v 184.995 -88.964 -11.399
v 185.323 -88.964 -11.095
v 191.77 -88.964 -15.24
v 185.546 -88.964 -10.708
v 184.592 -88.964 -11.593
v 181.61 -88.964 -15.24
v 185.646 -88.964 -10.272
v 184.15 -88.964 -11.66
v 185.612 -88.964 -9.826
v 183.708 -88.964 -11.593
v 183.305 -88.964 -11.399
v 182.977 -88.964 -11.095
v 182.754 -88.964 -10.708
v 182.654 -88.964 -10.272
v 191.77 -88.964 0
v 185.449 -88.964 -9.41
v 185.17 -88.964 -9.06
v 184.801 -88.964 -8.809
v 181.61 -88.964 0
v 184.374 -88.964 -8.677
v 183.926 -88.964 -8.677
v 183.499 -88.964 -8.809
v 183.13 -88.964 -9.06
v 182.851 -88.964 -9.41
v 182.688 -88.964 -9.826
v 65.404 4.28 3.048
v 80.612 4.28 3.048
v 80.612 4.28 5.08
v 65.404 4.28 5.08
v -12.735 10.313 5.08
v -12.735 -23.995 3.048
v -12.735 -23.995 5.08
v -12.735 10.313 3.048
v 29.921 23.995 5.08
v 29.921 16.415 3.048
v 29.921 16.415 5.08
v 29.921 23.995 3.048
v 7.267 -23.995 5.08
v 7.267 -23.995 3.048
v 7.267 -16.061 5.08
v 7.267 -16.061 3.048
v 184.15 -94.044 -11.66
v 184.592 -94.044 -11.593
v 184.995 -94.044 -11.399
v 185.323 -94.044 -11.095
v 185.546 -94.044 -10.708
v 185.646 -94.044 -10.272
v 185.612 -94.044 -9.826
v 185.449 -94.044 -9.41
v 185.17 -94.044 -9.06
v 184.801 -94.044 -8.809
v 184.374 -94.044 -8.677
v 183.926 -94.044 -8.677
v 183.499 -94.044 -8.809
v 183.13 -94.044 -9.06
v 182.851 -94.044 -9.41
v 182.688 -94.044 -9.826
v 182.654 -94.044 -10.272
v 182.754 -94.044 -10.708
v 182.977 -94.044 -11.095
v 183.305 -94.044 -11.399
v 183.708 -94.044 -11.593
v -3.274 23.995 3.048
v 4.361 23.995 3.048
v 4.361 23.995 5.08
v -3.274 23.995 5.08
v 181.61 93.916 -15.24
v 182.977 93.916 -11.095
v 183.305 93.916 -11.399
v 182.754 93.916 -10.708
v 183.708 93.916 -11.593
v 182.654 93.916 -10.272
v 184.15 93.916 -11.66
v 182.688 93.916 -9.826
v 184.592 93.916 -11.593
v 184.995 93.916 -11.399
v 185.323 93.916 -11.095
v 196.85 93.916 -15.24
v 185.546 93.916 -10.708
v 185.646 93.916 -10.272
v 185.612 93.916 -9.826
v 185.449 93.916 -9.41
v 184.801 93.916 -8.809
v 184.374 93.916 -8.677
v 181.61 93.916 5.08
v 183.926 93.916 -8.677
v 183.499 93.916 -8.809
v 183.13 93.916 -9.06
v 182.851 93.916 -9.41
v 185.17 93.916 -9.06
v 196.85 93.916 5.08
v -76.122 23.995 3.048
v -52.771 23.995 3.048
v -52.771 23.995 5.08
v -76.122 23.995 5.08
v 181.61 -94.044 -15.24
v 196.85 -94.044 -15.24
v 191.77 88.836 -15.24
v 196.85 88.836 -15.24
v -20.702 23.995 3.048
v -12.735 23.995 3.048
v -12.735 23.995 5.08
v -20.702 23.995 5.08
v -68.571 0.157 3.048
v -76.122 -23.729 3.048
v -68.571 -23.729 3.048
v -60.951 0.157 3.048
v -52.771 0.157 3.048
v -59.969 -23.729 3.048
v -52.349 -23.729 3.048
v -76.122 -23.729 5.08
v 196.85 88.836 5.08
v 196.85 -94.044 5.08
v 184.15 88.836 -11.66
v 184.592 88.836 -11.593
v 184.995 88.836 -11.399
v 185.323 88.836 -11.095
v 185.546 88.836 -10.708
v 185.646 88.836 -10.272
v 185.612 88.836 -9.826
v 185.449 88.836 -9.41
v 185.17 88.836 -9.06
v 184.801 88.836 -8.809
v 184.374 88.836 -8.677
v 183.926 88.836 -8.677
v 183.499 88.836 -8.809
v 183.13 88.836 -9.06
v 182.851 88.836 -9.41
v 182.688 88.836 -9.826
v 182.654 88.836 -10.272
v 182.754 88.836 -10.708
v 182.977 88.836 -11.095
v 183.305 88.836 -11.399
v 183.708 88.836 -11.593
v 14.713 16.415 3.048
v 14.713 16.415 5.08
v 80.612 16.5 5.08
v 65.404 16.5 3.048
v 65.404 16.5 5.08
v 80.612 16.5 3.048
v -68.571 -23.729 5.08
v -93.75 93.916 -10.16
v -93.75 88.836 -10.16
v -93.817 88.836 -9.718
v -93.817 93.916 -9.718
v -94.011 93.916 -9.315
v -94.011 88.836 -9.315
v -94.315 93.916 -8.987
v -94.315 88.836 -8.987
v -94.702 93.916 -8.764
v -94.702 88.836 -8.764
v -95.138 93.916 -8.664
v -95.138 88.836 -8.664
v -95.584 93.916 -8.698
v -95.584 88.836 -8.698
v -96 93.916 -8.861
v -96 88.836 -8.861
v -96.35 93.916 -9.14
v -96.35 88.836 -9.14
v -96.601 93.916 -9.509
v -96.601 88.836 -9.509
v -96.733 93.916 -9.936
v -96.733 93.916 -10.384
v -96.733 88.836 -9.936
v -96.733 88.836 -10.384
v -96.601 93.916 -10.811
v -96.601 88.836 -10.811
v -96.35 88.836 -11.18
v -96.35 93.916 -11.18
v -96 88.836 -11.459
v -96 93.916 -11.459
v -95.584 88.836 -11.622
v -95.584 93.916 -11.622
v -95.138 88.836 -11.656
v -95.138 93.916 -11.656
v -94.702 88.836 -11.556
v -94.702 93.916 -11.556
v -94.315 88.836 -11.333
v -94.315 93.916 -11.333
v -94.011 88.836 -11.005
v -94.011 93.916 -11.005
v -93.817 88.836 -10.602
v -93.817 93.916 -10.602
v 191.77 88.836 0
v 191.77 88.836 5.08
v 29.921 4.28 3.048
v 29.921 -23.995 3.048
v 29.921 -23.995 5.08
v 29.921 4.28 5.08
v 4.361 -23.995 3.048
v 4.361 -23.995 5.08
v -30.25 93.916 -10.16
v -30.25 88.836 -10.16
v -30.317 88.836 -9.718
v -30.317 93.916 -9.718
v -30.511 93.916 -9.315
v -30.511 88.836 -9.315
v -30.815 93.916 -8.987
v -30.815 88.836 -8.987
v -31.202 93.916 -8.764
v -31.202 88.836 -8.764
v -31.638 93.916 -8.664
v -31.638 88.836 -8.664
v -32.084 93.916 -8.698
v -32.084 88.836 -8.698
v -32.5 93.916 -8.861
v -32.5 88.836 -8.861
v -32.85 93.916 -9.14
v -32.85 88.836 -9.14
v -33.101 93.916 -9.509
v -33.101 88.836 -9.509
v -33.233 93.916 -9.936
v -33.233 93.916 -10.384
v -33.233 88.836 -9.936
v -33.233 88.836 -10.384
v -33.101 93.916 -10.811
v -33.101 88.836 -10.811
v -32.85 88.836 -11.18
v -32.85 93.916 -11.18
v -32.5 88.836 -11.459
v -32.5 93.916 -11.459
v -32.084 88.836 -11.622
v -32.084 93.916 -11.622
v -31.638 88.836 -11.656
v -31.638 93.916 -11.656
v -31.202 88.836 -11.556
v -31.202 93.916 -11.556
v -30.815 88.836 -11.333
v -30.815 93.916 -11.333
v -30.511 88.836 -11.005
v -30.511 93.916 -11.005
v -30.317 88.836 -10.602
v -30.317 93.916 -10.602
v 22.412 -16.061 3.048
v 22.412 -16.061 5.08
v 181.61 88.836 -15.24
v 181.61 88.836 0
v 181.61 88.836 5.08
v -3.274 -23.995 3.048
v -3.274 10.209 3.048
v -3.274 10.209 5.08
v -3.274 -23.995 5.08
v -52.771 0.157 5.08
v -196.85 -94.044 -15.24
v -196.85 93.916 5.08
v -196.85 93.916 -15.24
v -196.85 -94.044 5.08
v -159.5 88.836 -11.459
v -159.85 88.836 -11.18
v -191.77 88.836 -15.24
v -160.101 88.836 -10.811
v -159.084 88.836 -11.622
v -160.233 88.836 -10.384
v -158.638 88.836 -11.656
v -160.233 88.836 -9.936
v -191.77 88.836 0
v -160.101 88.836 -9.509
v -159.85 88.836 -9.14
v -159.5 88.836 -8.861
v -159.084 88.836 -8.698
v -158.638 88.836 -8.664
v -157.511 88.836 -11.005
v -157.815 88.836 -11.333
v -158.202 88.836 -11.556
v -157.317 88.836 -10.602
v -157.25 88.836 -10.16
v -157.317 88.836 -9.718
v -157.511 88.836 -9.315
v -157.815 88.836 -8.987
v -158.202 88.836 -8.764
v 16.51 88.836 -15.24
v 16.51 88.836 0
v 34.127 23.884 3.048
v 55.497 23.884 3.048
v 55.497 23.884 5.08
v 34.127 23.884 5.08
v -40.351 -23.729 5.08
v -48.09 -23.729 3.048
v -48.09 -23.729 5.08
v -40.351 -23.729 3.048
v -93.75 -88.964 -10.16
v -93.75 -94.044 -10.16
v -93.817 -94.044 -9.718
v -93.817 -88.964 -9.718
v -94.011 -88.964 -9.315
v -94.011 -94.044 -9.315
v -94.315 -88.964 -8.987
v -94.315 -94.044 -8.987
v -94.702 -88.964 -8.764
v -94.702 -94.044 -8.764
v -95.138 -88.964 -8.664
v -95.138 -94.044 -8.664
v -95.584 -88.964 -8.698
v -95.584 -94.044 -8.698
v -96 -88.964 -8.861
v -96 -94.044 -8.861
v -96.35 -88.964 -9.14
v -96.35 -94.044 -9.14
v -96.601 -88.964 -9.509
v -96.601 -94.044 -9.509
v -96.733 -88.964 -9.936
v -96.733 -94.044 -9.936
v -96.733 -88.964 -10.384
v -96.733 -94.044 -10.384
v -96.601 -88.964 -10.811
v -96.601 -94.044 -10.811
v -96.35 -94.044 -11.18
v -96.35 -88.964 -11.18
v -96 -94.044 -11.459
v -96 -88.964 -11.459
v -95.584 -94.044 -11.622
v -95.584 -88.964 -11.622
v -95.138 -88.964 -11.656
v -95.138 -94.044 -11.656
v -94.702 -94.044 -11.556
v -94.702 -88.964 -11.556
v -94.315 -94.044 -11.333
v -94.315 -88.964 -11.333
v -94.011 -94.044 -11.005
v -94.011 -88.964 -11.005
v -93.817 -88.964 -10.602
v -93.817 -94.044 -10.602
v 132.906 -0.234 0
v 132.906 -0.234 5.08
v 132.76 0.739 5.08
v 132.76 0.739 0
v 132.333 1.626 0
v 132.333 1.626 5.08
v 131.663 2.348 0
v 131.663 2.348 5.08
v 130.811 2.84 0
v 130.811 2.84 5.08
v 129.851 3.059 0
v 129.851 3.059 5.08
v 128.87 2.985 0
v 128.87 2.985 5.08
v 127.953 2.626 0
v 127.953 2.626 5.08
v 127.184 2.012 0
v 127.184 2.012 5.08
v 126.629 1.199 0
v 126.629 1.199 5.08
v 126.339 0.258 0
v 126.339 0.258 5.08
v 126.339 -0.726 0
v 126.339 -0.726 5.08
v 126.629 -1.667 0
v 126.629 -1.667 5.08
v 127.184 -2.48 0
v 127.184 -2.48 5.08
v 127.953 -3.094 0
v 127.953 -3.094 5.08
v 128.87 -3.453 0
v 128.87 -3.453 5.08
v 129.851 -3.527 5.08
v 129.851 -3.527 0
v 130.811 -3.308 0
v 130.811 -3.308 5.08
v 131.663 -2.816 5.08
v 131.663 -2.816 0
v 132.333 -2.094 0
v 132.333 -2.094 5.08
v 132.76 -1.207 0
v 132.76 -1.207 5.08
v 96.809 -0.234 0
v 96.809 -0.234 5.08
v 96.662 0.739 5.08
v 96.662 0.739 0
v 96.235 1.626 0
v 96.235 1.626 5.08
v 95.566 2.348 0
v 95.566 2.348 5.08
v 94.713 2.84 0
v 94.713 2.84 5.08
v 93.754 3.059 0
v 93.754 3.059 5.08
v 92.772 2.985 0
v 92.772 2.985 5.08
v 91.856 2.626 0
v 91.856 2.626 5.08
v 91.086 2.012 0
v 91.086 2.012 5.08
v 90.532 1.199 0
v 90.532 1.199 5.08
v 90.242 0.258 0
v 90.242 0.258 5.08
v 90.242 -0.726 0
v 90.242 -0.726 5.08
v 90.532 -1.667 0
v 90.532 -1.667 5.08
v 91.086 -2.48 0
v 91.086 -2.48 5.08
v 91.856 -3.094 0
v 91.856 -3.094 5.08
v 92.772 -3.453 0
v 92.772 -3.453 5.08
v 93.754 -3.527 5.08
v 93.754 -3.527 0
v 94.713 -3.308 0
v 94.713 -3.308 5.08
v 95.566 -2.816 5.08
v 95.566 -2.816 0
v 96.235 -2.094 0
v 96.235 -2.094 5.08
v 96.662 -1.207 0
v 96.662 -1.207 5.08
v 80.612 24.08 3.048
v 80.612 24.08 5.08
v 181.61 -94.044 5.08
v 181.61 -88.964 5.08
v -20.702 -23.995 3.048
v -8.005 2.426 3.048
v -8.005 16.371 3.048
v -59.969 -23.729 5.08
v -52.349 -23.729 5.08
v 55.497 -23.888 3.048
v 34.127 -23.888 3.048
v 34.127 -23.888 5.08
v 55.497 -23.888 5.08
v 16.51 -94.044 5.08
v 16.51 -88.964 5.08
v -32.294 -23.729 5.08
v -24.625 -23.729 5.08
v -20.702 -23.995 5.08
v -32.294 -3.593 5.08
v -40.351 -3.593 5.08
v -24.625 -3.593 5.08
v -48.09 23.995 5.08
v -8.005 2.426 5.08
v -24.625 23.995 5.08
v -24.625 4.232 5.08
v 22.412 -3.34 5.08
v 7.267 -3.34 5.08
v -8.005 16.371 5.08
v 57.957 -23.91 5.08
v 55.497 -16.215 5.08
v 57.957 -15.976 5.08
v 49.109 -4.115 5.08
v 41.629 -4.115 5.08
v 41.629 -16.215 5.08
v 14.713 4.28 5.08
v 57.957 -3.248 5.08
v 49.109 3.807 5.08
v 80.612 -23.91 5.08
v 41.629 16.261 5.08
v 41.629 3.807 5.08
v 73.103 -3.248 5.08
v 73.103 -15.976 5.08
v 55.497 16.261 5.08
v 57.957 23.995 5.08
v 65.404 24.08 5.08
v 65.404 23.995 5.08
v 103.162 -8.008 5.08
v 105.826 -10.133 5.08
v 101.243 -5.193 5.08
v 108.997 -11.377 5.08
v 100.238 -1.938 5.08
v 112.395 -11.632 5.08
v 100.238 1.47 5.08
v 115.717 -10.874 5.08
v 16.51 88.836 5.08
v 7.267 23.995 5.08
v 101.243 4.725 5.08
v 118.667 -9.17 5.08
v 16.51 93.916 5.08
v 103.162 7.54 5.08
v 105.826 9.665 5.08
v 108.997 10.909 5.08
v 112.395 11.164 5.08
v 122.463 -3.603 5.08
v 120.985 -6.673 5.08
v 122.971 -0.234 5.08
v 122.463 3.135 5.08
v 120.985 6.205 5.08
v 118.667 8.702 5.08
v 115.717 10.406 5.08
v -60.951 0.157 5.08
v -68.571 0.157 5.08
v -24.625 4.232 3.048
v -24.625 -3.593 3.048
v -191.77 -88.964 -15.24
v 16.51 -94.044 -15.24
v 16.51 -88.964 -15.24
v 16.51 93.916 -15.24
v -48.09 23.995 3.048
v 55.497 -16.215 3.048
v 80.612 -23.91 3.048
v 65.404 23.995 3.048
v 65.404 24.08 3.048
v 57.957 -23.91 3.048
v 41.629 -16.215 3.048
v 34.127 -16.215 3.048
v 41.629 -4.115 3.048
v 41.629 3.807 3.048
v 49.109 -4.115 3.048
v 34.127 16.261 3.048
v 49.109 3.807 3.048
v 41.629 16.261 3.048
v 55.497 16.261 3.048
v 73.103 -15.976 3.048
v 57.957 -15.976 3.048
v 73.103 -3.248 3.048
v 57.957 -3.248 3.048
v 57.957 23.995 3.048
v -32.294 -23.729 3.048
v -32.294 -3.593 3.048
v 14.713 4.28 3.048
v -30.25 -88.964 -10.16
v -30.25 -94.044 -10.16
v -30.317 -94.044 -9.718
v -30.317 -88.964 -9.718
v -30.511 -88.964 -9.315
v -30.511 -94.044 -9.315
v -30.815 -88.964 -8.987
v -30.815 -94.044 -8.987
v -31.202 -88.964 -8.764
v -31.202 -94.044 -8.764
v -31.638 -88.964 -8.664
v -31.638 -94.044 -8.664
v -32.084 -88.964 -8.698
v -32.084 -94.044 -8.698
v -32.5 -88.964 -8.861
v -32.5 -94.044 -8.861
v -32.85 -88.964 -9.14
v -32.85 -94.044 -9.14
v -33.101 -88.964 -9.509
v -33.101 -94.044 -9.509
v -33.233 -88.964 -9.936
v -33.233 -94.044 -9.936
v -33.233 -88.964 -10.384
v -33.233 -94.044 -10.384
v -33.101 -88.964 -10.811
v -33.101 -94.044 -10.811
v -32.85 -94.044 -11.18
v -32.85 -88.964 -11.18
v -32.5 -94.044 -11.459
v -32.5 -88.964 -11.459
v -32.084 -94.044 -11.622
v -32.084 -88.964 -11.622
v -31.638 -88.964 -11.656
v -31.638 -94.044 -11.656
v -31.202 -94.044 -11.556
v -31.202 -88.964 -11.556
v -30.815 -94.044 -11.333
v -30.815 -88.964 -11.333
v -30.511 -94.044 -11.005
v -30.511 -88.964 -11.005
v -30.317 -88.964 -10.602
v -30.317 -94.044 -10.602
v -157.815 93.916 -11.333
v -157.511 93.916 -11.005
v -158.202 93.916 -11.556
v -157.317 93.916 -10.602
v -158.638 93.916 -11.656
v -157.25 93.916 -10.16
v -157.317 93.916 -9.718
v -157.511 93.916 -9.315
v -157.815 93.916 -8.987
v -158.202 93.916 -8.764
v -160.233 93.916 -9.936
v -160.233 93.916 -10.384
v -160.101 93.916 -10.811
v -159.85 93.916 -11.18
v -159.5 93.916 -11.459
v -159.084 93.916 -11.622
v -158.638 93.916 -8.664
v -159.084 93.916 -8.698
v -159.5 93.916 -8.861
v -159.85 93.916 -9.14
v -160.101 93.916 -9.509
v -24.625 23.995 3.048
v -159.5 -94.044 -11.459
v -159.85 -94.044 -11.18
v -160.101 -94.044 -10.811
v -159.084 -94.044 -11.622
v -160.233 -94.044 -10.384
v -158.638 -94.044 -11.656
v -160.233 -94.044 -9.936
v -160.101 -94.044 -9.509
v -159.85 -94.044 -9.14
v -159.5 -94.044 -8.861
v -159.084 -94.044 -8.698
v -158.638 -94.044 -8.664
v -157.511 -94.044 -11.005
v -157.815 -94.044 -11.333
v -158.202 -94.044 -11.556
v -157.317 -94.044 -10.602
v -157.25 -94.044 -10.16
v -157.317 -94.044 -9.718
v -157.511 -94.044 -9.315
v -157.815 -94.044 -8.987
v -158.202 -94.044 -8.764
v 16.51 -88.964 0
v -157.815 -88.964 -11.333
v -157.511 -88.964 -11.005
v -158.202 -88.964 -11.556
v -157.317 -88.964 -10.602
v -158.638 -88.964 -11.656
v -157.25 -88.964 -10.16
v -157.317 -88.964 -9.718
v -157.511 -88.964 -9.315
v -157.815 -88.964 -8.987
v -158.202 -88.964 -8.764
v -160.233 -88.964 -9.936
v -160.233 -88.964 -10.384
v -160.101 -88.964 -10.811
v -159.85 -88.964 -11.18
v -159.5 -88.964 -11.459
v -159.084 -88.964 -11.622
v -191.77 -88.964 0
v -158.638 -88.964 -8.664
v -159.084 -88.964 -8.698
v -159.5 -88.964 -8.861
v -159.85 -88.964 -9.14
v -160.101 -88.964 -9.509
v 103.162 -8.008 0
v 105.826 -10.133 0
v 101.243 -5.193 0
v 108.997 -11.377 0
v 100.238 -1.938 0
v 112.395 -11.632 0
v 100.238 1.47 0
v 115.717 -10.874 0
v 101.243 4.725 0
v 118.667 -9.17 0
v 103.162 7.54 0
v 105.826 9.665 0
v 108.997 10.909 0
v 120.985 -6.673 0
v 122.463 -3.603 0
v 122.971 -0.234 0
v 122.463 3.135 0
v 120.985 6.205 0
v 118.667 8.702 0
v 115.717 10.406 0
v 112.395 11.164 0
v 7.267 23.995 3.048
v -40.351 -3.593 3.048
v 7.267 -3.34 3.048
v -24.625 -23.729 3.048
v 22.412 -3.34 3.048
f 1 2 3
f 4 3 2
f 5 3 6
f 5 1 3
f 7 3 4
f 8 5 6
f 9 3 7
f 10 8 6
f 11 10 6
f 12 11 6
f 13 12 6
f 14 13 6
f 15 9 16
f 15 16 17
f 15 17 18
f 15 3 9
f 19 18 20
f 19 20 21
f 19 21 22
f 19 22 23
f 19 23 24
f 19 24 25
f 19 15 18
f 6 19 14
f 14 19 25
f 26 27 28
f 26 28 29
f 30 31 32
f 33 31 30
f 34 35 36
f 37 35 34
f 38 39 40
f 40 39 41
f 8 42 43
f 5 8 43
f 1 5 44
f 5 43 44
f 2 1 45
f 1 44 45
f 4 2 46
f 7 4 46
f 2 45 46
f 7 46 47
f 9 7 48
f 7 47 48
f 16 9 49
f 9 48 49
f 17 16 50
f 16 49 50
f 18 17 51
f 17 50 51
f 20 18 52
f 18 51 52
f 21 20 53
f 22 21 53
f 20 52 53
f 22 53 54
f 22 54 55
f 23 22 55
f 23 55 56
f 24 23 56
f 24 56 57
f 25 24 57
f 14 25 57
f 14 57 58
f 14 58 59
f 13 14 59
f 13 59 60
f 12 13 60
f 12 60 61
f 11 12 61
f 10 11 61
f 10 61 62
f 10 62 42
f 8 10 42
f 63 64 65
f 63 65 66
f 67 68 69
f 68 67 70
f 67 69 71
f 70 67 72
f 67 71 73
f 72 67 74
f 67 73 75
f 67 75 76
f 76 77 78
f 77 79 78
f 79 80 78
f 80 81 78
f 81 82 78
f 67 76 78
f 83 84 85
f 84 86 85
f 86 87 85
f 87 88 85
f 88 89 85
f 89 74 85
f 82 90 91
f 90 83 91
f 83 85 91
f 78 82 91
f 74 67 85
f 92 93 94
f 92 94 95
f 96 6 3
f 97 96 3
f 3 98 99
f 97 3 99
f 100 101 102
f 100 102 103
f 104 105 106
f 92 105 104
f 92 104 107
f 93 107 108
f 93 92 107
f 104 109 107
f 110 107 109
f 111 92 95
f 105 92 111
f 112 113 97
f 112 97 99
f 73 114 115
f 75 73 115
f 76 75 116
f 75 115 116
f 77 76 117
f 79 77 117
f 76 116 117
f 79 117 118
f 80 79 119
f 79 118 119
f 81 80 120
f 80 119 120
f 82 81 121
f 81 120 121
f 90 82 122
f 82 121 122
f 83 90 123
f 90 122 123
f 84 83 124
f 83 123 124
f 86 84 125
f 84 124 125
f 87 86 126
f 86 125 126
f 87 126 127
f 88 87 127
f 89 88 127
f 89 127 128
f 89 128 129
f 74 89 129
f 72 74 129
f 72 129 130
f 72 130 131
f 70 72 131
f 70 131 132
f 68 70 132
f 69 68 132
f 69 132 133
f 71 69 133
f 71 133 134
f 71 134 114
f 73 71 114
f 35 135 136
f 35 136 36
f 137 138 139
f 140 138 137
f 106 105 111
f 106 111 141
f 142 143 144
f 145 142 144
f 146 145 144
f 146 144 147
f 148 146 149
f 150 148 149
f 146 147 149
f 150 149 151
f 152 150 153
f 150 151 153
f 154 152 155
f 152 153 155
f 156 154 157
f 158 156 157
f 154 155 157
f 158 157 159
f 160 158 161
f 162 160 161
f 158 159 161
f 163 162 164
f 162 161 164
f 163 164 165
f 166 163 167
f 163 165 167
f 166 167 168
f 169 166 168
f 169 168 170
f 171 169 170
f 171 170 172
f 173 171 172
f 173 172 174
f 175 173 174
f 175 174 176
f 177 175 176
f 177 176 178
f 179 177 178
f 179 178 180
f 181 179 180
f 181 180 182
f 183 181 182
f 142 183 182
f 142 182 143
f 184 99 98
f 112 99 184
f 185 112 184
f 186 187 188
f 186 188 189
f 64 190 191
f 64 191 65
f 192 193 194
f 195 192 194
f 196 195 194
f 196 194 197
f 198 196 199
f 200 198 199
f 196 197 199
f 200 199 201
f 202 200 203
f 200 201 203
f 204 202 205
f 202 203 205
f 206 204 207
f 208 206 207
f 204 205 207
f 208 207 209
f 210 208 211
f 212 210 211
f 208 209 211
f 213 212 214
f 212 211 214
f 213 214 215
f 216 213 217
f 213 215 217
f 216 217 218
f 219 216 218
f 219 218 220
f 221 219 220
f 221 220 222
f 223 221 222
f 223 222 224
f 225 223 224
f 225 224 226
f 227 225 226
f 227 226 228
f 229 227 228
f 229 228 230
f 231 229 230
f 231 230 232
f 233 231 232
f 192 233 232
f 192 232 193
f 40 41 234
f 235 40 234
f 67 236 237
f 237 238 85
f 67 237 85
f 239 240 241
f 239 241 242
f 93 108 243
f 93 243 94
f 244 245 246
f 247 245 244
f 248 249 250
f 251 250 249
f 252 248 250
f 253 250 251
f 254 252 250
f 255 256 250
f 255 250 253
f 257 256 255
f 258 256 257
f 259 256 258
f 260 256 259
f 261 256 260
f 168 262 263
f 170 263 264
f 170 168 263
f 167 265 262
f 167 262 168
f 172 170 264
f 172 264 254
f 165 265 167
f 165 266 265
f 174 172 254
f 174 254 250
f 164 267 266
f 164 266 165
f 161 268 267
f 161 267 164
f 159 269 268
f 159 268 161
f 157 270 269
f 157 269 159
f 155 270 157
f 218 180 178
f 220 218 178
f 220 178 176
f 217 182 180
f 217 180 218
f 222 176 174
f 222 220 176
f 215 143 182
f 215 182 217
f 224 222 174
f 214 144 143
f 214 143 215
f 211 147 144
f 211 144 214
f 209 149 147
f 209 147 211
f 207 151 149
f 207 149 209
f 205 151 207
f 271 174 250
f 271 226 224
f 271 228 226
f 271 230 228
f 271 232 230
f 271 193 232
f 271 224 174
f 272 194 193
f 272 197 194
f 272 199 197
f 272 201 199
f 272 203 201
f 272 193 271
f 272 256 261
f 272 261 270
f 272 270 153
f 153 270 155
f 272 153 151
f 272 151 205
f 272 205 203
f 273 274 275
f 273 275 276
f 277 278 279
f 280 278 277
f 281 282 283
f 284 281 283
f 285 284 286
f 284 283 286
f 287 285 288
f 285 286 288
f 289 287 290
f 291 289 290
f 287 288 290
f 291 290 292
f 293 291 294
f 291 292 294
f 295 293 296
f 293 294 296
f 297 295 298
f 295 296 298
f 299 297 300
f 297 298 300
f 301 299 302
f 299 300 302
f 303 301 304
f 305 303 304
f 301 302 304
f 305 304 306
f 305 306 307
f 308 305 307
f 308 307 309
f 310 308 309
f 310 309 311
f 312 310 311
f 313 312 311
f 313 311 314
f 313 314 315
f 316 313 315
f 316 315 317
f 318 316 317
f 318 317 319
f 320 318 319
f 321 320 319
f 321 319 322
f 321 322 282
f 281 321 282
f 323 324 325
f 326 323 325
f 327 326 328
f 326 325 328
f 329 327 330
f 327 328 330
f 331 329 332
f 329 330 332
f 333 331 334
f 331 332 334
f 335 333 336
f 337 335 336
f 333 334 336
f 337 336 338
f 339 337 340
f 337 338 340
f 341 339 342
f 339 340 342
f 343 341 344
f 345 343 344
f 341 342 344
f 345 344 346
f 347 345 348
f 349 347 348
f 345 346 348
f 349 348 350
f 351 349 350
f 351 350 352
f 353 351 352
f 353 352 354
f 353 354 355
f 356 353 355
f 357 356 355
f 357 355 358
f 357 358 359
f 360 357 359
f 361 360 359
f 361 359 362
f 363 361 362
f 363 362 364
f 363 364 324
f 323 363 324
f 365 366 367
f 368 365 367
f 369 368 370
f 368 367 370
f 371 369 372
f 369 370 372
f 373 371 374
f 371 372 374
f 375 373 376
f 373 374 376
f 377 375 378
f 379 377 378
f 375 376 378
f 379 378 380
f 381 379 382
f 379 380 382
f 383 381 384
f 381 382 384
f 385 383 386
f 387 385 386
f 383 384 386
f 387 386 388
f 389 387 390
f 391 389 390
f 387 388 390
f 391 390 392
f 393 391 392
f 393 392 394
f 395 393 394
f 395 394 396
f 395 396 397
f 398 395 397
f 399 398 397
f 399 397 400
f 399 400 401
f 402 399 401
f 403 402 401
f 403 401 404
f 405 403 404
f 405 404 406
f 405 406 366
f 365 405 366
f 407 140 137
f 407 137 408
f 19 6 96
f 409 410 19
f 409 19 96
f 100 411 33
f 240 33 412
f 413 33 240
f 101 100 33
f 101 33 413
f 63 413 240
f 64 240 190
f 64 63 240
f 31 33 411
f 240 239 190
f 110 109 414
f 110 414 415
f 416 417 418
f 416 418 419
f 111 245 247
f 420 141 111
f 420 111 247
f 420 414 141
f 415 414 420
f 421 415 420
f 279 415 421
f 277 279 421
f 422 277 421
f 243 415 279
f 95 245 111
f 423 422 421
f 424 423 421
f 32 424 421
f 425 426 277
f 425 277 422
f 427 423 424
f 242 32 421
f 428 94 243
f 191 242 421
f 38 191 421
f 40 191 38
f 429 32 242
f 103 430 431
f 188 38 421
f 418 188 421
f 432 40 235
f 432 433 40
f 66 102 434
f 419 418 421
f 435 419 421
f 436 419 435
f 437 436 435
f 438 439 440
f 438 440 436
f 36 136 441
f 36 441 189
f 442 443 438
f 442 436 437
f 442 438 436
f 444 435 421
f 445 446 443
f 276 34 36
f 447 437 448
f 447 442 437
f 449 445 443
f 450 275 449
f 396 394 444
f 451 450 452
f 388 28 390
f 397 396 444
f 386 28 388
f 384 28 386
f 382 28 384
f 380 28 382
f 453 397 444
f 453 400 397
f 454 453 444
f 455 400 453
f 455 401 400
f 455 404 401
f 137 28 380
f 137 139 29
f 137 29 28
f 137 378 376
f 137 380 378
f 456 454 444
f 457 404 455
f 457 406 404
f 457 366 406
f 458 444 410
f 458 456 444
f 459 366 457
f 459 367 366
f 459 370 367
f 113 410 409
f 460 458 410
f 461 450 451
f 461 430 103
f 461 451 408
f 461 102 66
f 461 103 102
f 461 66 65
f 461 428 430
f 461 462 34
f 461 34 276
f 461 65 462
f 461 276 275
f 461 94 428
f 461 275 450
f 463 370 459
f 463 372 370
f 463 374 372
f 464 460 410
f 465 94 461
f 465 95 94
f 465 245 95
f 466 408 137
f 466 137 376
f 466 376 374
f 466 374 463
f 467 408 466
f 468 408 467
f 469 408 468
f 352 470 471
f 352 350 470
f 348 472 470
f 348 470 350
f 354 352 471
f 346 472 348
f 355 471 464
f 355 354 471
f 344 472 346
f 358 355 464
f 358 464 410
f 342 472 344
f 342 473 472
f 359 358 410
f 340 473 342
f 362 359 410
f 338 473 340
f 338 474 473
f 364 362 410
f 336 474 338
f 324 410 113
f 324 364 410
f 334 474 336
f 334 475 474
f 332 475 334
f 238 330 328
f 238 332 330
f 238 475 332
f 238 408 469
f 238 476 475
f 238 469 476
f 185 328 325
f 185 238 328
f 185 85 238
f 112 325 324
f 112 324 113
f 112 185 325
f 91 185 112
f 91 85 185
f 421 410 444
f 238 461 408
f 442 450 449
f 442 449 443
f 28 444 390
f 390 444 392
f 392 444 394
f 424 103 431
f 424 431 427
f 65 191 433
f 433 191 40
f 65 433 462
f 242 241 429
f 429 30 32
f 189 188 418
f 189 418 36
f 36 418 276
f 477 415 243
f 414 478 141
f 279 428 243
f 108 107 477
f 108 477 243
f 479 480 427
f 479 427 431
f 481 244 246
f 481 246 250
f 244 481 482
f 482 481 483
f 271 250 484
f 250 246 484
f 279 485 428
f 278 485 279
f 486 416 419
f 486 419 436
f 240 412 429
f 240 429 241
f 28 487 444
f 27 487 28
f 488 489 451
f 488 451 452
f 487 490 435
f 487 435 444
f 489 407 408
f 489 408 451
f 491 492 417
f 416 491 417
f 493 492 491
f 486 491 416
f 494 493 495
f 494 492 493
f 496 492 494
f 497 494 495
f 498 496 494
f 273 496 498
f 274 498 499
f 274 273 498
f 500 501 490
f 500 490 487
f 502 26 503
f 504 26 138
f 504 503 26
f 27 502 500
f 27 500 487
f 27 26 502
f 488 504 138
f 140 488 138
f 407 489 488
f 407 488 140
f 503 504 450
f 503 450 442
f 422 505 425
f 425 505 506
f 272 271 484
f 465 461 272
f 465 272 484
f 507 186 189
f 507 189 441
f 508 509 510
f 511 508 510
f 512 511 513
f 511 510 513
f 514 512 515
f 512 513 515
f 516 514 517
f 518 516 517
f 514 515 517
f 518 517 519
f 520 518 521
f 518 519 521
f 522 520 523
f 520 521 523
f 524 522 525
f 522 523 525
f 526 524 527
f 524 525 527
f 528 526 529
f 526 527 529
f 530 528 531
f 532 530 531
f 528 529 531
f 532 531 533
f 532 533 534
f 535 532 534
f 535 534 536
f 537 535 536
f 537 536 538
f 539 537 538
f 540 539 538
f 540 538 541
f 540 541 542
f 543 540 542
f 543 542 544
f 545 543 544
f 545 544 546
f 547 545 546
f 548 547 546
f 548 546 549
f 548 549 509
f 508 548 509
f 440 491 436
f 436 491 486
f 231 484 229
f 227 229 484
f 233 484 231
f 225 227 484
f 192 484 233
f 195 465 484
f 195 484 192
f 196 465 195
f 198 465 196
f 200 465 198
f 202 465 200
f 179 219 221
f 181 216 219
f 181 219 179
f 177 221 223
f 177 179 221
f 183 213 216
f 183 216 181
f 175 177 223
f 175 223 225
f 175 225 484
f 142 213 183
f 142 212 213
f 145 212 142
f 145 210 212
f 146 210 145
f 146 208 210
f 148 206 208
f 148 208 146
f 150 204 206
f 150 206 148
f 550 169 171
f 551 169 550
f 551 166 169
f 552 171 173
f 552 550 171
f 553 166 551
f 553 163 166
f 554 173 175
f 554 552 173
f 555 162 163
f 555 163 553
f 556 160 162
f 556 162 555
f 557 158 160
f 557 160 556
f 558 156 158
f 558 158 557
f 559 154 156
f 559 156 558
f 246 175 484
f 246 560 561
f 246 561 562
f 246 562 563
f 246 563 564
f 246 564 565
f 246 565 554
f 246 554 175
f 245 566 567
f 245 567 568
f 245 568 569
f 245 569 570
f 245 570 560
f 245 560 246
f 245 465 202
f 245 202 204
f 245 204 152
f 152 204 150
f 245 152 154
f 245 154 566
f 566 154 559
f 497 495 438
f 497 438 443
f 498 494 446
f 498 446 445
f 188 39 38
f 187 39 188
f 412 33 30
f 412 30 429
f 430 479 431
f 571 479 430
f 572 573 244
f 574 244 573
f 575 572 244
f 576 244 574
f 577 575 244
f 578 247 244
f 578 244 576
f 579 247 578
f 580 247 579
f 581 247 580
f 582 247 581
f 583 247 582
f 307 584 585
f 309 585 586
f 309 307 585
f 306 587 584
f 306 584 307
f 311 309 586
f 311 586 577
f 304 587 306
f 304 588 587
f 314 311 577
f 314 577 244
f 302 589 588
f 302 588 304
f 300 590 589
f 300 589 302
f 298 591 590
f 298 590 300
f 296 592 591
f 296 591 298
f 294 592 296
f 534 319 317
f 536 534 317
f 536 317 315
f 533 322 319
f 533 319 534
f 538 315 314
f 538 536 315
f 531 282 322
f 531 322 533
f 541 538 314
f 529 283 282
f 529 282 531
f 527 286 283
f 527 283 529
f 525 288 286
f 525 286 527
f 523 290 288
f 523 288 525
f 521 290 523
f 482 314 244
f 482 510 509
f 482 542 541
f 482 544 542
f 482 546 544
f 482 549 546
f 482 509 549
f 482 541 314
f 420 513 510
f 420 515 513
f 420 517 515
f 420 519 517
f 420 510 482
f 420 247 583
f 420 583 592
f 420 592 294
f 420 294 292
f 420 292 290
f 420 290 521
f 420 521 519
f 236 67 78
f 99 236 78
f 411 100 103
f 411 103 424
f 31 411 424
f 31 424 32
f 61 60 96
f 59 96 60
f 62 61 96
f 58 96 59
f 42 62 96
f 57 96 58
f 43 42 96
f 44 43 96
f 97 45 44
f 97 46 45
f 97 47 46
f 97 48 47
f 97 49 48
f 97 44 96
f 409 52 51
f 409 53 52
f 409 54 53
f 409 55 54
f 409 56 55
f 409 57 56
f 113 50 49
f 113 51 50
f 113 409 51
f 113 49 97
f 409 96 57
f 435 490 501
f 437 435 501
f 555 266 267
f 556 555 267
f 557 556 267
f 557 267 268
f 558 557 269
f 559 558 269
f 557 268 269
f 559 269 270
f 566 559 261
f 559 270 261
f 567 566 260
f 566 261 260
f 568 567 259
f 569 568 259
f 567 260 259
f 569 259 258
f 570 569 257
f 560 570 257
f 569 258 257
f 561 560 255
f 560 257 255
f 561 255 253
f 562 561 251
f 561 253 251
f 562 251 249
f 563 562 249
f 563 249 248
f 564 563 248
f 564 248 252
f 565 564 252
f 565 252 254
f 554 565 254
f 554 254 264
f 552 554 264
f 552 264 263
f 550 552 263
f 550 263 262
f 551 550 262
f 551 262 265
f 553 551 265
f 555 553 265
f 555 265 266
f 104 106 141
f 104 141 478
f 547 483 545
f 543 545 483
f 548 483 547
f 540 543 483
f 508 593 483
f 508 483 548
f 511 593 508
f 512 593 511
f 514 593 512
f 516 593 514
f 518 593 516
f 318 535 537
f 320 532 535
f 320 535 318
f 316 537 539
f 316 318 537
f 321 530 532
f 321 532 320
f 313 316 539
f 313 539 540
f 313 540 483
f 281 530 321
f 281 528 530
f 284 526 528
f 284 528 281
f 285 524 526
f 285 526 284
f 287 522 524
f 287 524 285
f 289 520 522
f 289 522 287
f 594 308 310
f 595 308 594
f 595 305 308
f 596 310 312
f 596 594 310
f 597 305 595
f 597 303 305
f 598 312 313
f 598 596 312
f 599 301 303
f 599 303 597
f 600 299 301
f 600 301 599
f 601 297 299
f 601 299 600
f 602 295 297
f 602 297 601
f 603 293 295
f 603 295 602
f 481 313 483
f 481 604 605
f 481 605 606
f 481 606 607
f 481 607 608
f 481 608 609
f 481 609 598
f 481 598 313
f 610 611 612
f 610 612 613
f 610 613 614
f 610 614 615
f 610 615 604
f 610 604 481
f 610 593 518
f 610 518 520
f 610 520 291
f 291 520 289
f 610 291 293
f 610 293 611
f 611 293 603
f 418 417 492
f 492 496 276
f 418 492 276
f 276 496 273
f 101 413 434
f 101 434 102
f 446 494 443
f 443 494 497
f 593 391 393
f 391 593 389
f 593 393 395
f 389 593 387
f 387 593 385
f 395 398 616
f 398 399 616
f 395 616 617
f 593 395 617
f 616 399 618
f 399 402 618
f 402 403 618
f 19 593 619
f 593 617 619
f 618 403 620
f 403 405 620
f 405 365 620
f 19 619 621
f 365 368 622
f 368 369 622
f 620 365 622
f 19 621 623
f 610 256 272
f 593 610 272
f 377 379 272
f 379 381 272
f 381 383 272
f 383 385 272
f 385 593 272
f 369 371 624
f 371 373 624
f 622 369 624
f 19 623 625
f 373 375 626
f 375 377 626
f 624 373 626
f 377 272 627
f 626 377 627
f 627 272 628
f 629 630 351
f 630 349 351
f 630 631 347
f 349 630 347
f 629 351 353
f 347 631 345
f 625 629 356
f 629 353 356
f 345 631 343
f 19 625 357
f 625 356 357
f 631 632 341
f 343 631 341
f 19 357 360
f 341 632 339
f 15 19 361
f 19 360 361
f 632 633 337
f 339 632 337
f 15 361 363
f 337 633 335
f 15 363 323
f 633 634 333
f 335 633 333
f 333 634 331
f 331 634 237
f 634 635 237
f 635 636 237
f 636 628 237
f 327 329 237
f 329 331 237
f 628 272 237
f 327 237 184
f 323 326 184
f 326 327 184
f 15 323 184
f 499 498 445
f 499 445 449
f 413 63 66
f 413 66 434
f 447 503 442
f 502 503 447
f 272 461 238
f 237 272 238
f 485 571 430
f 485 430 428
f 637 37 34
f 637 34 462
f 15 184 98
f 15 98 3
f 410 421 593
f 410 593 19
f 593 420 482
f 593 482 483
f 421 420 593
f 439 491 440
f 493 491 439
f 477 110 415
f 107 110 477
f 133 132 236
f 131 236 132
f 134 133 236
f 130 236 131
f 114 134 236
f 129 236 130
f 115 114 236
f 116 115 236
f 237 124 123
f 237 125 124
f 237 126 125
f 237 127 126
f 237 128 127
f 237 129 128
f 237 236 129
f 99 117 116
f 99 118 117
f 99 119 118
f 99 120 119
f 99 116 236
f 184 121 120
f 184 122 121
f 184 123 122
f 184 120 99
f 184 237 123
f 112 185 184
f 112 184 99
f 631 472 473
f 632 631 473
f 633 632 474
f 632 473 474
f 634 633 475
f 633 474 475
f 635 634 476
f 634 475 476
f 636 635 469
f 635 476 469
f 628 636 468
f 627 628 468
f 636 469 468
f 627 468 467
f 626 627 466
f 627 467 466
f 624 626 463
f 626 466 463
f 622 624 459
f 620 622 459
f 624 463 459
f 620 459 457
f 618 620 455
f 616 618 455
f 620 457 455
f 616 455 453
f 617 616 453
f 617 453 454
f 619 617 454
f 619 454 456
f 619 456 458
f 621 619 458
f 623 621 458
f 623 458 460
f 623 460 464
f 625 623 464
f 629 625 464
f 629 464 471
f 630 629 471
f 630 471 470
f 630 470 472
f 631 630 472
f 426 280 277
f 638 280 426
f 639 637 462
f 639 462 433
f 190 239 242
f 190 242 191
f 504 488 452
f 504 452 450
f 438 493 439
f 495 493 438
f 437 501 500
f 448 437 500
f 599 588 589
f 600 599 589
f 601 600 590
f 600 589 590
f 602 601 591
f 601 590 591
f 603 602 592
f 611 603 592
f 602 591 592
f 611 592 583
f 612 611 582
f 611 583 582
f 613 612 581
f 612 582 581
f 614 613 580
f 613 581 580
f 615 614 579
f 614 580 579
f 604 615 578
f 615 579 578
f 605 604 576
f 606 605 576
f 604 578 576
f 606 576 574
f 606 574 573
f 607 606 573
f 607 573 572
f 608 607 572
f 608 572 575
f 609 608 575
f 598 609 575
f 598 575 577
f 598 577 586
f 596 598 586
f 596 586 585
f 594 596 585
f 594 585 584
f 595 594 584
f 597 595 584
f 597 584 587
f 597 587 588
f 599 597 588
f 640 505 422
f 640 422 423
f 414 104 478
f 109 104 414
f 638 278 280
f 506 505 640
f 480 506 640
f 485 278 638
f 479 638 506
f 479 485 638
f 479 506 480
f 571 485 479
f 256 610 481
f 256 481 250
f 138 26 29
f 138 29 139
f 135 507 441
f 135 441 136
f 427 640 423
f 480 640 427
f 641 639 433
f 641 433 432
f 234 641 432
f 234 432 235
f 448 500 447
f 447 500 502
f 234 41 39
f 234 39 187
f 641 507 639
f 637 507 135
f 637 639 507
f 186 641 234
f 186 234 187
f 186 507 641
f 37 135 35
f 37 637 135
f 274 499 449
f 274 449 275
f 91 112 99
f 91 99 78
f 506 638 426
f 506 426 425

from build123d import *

# Parameters (mm, degrees)
SKETCH1_W               = 383.54
SKETCH1_H               = 228.6
BOSS_EXTRUDE1_DEPTH     = 5.08
CUT_EXTRUDE4_DEPTH      = 2.54
CUT_EXTRUDE4_DEPTH_BACK = 2.032
SKETCH3_W               = 7.551410014
SKETCH3_H               = 7.624040678
SKETCH3_W_2             = 8.426229182
SKETCH3_W_3             = 7.372950534
SKETCH3_H_2             = 8.377243284
SKETCH3_H_3             = 7.836309586
SKETCH3_H_4             = 23.885974754
SKETCH3_W_4             = 7.738672286
SKETCH3_W_5             = 8.057581655
SKETCH3_W_6             = 7.668237515
SKETCH3_H_5             = 12.138714326
SKETCH3_H_6             = 7.824594082
SKETCH3_H_7             = 20.136219216
SKETCH3_W_7             = 15.20808594
SKETCH3_H_8             = 7.579699467
SKETCH3_W_8             = 7.446662222
SKETCH3_W_9             = 13.868168861
SKETCH3_H_9             = 7.623435987
SKETCH3_H_10            = 12.134909421
SKETCH3_H_11            = 7.62
SKETCH3_W_10            = 7.699091451
SKETCH3_W_11            = 7.508994489
SKETCH3_H_12            = 12.721182216
SKETCH3_H_13            = 7.933797838
SKETCH3_W_12            = 15.145753673
SKETCH3_W_13            = 7.502078631
SKETCH3_W_14            = 7.480081761
SKETCH3_H_14            = 7.922088466
SKETCH3_H_15            = 7.672421885
SKETCH3_H_16            = 12.219933912
SKETCH3_H_17            = 7.494674976
SKETCH3_W_15            = 10.718331987
SKETCH3_H_18            = 7.528655491
SKETCH3_H_19            = 7.933797839
SKETCH3_W_16            = 3.019240536
SKETCH3_W_17            = 4.489753953
SKETCH3_H_20            = 12.727502234
SKETCH4_W               = 383.54
SKETCH4_H               = 25.463727846
SKETCH4_H_2             = 25.336272154
CUT_EXTRUDE5_DEPTH      = 6.35
SKETCH7_R               = 3.302
SKETCH7_R_2             = 11.43
CUT_EXTRUDE6_DEPTH      = 203.2
SKETCH8_W               = 15.24
SKETCH8_H               = 5.08
BOSS_EXTRUDE2_DEPTH     = 20.32
SKETCH11_R              = 1.5
CUT_EXTRUDE7_DEPTH      = 381


with BuildPart() as part:
    # Sketch1 → Boss-Extrude1 (new body)
    with BuildSketch(Plane.XY):
        Rectangle(SKETCH1_W, SKETCH1_H)
    extrude(amount=BOSS_EXTRUDE1_DEPTH)

    # Sketch3 → Cut-Extrude4 (cut, two sides: drawn at the far end of the back side and taken through both)
    with BuildSketch(Plane.XY.offset(5.08).offset(-CUT_EXTRUDE4_DEPTH_BACK)):
        with Locations((-72.346363981, 20.182774132)):
            Rectangle(SKETCH3_W, SKETCH3_H)
        with Locations((-64.357544383, 20.182774132)):
            Rectangle(SKETCH3_W_2, SKETCH3_H)
        with Locations((-56.457954525, 20.182774132)):
            Rectangle(SKETCH3_W_3, SKETCH3_H)
        with Locations((-56.457954525, 12.182132151)):
            Rectangle(SKETCH3_W_3, SKETCH3_H_2)
        with Locations((-72.346363981, 4.075355716)):
            Rectangle(SKETCH3_W, SKETCH3_H_3)
        with Locations((-72.346363981, -11.785786454)):
            Rectangle(SKETCH3_W, SKETCH3_H_4)
        with Locations((-72.346363981, 12.182132151)):
            Rectangle(SKETCH3_W, SKETCH3_H_2)
        with Locations((-64.357544383, 12.182132151)):
            Rectangle(SKETCH3_W_2, SKETCH3_H_2)
        Polygon((-68.570658974, 7.993510509), (-68.570658974, 0.157200923), (-60.950658974, 0.157200923), (-52.771479258, 0.157200923), (-52.771479258, 7.993510509), (-60.144429792, 7.993510509), align=None)
        Polygon((-68.570658974, 0.157200923), (-59.968883351, -23.728773831), (-52.348883351, -23.728773831), (-60.950658974, 0.157200923), align=None)
        with Locations((-44.220529343, 20.182774132)):
            Rectangle(SKETCH3_W_4, SKETCH3_H)
        with Locations((-36.322402373, 20.182774132)):
            Rectangle(SKETCH3_W_5, SKETCH3_H)
        with Locations((-28.459492788, 20.182774132)):
            Rectangle(SKETCH3_W_6, SKETCH3_H)
        with Locations((-28.459492788, 10.30139663)):
            Rectangle(SKETCH3_W_6, SKETCH3_H_5)
        with Locations((-36.322402373, 10.30139663)):
            Rectangle(SKETCH3_W_5, SKETCH3_H_5)
        with Locations((-44.220529343, 10.30139663)):
            Rectangle(SKETCH3_W_4, SKETCH3_H_5)
        with Locations((-44.220529343, 0.319742426)):
            Rectangle(SKETCH3_W_4, SKETCH3_H_6)
        with Locations((-36.322402373, 0.319742426)):
            Rectangle(SKETCH3_W_5, SKETCH3_H_6)
        Polygon((-24.62537403, 0.157200923), (-24.62537403, 4.232039467), (-32.293611545, 4.232039467), (-32.293611545, -3.592554615), (-24.62537403, -3.592554615), align=None)
        with Locations((-44.220529343, -13.660664223)):
            Rectangle(SKETCH3_W_4, SKETCH3_H_7)
        with Locations((-28.459492788, -13.660664223)):
            Rectangle(SKETCH3_W_6, SKETCH3_H_7)
        Polygon((-12.735071294, 23.994794471), (-20.70205372, 23.994794471), (-20.70205372, -23.994794471), (-12.735071294, -23.994794471), (-12.735071294, 10.313389338), align=None)
        Polygon((-8.004675478, 16.370753793), (-12.735071294, 23.994794471), (-12.735071294, 10.313389338), (-8.004675478, 2.426315091), (-3.274279663, 10.208504268), (-3.274279663, 23.994794471), align=None)
        Polygon((4.360745163, 23.994794471), (-3.274279663, 23.994794471), (-3.274279663, 10.208504268), (-3.274279663, -23.994794471), (4.360745163, -23.994794471), align=None)
        with Locations((22.317437477, 20.204944737)):
            Rectangle(SKETCH3_W_7, SKETCH3_H_8)
        with Locations((10.990063396, 20.204944737)):
            Rectangle(SKETCH3_W_8, SKETCH3_H_8)
        with Locations((48.563017268, 20.072456114)):
            Rectangle(SKETCH3_W_9, SKETCH3_H_9)
        with Locations((10.990063396, 10.347640294)):
            Rectangle(SKETCH3_W_8, SKETCH3_H_10)
        with Locations((10.990063396, 0.470185583)):
            Rectangle(SKETCH3_W_8, SKETCH3_H_11)
        with Locations((18.562940233, 0.470185583)):
            Rectangle(SKETCH3_W_10, SKETCH3_H_11)
        with Locations((26.166983202, 0.470185583)):
            Rectangle(SKETCH3_W_11, SKETCH3_H_11)
        with Locations((26.166983202, -9.700405525)):
            Rectangle(SKETCH3_W_11, SKETCH3_H_12)
        with Locations((26.166983202, -20.027895552)):
            Rectangle(SKETCH3_W_11, SKETCH3_H_13)
        with Locations((14.839609122, -20.027895552)):
            Rectangle(SKETCH3_W_12, SKETCH3_H_13)
        with Locations((37.877893521, 20.072456114)):
            Rectangle(SKETCH3_W_13, SKETCH3_H_9)
        Polygon((41.628932837, 16.26073812), (34.126854206, 16.26073812), (34.126854206, -16.215353517), (41.628932837, -16.215353517), (41.628932837, -4.115401118), (34.148851076, -4.115401118), (34.148851076, 3.806687348), (41.628932837, 3.806687348), align=None)
        with Locations((37.888891957, -0.154356885)):
            Rectangle(SKETCH3_W_14, SKETCH3_H_14)
        with Locations((45.368973717, -0.154356885)):
            Rectangle(SKETCH3_W_14, SKETCH3_H_14)
        with Locations((37.877893521, -20.051564459)):
            Rectangle(SKETCH3_W_13, SKETCH3_H_15)
        with Locations((48.563017268, -20.051564459)):
            Rectangle(SKETCH3_W_9, SKETCH3_H_15)
        with Locations((61.68040589, 10.390152539)):
            Rectangle(SKETCH3_W_8, SKETCH3_H_16)
        with Locations((61.68040589, 20.247456983)):
            Rectangle(SKETCH3_W_8, SKETCH3_H_17)
        with Locations((70.762902995, 20.247456983)):
            Rectangle(SKETCH3_W_15, SKETCH3_H_17)
        Polygon((65.403737001, 24.079818962), (65.403737001, 23.994794471), (76.122068988, 23.994794471), (76.122068988, 16.500119495), (80.611822941, 16.500119495), (80.611822941, 24.079818962), align=None)
        with Locations((61.68040589, 0.515857838)):
            Rectangle(SKETCH3_W_8, SKETCH3_H_18)
        with Locations((65.529951616, -19.942871061)):
            Rectangle(SKETCH3_W_12, SKETCH3_H_19)
        with Locations((69.253282727, 0.515857838)):
            Rectangle(SKETCH3_W_10, SKETCH3_H_18)
        with Locations((74.61244872, 0.515857838)):
            Rectangle(SKETCH3_W_16, SKETCH3_H_18)
        with Locations((78.366945965, 0.515857838)):
            Rectangle(SKETCH3_W_17, SKETCH3_H_18)
        with Locations((78.366945965, -9.612221025)):
            Rectangle(SKETCH3_W_17, SKETCH3_H_20)
        with Locations((74.61244872, -9.612221025)):
            Rectangle(SKETCH3_W_16, SKETCH3_H_20)
        with Locations((74.61244872, -19.942871061)):
            Rectangle(SKETCH3_W_16, SKETCH3_H_19)
        with Locations((78.366945965, -19.942871061)):
            Rectangle(SKETCH3_W_17, SKETCH3_H_19)
    extrude(amount=CUT_EXTRUDE4_DEPTH + CUT_EXTRUDE4_DEPTH_BACK, mode=Mode.SUBTRACT)

    # Sketch4 → Cut-Extrude5 (cut)
    with BuildSketch(Plane.XY.offset(5.08)):
        with Locations((0, 101.568136077)):
            Rectangle(SKETCH4_W, SKETCH4_H)
        with Locations((0, -101.631863923)):
            Rectangle(SKETCH4_W, SKETCH4_H_2)
    extrude(amount=-CUT_EXTRUDE5_DEPTH, mode=Mode.SUBTRACT)

    # Sketch7 → Cut-Extrude6 (cut)
    with BuildSketch(Plane.XY.offset(5.08)):
        with Locations((93.506776136, -0.23396958)):
            Circle(SKETCH7_R)
        with Locations((111.540776136, -0.23396958)):
            Circle(SKETCH7_R_2)
        with Locations((129.604477858, -0.23396958)):
            Circle(SKETCH7_R)
    extrude(amount=-CUT_EXTRUDE6_DEPTH, mode=Mode.SUBTRACT)

    # Sketch8 → Boss-Extrude2 (add)
    with BuildSketch(Plane.XY.offset(5.08)):
        Polygon((16.51, 93.916272154), (-196.85, 93.916272154), (-196.85, -94.043727846), (16.51, -94.043727846), (16.51, -88.963727846), (-191.77, -88.963727846), (-191.77, 88.836272154), (16.51, 88.836272154), align=None)
        with Locations((189.23, 91.376272154)):
            Rectangle(SKETCH8_W, SKETCH8_H)
        Polygon((196.85, 88.835766484), (191.77, 88.835766484), (191.77, -88.963727846), (181.61, -88.963727846), (181.61, -94.043727846), (196.85, -94.043727846), align=None)
    extrude(amount=-BOSS_EXTRUDE2_DEPTH)

    # Sketch11 → Cut-Extrude7 (cut)
    with BuildSketch(Plane.XZ.offset(94.043727846)):
        with Locations((-158.75, -10.16)):
            Circle(SKETCH11_R)
        with Locations((-95.25, -10.16)):
            Circle(SKETCH11_R)
        with Locations(Location((184.15, -10.16, 0), (0, 0, 270))):
            Circle(SKETCH11_R)
        with Locations((-31.75, -10.16)):
            Circle(SKETCH11_R)
    extrude(amount=-CUT_EXTRUDE7_DEPTH, mode=Mode.SUBTRACT)


solid = part.part
